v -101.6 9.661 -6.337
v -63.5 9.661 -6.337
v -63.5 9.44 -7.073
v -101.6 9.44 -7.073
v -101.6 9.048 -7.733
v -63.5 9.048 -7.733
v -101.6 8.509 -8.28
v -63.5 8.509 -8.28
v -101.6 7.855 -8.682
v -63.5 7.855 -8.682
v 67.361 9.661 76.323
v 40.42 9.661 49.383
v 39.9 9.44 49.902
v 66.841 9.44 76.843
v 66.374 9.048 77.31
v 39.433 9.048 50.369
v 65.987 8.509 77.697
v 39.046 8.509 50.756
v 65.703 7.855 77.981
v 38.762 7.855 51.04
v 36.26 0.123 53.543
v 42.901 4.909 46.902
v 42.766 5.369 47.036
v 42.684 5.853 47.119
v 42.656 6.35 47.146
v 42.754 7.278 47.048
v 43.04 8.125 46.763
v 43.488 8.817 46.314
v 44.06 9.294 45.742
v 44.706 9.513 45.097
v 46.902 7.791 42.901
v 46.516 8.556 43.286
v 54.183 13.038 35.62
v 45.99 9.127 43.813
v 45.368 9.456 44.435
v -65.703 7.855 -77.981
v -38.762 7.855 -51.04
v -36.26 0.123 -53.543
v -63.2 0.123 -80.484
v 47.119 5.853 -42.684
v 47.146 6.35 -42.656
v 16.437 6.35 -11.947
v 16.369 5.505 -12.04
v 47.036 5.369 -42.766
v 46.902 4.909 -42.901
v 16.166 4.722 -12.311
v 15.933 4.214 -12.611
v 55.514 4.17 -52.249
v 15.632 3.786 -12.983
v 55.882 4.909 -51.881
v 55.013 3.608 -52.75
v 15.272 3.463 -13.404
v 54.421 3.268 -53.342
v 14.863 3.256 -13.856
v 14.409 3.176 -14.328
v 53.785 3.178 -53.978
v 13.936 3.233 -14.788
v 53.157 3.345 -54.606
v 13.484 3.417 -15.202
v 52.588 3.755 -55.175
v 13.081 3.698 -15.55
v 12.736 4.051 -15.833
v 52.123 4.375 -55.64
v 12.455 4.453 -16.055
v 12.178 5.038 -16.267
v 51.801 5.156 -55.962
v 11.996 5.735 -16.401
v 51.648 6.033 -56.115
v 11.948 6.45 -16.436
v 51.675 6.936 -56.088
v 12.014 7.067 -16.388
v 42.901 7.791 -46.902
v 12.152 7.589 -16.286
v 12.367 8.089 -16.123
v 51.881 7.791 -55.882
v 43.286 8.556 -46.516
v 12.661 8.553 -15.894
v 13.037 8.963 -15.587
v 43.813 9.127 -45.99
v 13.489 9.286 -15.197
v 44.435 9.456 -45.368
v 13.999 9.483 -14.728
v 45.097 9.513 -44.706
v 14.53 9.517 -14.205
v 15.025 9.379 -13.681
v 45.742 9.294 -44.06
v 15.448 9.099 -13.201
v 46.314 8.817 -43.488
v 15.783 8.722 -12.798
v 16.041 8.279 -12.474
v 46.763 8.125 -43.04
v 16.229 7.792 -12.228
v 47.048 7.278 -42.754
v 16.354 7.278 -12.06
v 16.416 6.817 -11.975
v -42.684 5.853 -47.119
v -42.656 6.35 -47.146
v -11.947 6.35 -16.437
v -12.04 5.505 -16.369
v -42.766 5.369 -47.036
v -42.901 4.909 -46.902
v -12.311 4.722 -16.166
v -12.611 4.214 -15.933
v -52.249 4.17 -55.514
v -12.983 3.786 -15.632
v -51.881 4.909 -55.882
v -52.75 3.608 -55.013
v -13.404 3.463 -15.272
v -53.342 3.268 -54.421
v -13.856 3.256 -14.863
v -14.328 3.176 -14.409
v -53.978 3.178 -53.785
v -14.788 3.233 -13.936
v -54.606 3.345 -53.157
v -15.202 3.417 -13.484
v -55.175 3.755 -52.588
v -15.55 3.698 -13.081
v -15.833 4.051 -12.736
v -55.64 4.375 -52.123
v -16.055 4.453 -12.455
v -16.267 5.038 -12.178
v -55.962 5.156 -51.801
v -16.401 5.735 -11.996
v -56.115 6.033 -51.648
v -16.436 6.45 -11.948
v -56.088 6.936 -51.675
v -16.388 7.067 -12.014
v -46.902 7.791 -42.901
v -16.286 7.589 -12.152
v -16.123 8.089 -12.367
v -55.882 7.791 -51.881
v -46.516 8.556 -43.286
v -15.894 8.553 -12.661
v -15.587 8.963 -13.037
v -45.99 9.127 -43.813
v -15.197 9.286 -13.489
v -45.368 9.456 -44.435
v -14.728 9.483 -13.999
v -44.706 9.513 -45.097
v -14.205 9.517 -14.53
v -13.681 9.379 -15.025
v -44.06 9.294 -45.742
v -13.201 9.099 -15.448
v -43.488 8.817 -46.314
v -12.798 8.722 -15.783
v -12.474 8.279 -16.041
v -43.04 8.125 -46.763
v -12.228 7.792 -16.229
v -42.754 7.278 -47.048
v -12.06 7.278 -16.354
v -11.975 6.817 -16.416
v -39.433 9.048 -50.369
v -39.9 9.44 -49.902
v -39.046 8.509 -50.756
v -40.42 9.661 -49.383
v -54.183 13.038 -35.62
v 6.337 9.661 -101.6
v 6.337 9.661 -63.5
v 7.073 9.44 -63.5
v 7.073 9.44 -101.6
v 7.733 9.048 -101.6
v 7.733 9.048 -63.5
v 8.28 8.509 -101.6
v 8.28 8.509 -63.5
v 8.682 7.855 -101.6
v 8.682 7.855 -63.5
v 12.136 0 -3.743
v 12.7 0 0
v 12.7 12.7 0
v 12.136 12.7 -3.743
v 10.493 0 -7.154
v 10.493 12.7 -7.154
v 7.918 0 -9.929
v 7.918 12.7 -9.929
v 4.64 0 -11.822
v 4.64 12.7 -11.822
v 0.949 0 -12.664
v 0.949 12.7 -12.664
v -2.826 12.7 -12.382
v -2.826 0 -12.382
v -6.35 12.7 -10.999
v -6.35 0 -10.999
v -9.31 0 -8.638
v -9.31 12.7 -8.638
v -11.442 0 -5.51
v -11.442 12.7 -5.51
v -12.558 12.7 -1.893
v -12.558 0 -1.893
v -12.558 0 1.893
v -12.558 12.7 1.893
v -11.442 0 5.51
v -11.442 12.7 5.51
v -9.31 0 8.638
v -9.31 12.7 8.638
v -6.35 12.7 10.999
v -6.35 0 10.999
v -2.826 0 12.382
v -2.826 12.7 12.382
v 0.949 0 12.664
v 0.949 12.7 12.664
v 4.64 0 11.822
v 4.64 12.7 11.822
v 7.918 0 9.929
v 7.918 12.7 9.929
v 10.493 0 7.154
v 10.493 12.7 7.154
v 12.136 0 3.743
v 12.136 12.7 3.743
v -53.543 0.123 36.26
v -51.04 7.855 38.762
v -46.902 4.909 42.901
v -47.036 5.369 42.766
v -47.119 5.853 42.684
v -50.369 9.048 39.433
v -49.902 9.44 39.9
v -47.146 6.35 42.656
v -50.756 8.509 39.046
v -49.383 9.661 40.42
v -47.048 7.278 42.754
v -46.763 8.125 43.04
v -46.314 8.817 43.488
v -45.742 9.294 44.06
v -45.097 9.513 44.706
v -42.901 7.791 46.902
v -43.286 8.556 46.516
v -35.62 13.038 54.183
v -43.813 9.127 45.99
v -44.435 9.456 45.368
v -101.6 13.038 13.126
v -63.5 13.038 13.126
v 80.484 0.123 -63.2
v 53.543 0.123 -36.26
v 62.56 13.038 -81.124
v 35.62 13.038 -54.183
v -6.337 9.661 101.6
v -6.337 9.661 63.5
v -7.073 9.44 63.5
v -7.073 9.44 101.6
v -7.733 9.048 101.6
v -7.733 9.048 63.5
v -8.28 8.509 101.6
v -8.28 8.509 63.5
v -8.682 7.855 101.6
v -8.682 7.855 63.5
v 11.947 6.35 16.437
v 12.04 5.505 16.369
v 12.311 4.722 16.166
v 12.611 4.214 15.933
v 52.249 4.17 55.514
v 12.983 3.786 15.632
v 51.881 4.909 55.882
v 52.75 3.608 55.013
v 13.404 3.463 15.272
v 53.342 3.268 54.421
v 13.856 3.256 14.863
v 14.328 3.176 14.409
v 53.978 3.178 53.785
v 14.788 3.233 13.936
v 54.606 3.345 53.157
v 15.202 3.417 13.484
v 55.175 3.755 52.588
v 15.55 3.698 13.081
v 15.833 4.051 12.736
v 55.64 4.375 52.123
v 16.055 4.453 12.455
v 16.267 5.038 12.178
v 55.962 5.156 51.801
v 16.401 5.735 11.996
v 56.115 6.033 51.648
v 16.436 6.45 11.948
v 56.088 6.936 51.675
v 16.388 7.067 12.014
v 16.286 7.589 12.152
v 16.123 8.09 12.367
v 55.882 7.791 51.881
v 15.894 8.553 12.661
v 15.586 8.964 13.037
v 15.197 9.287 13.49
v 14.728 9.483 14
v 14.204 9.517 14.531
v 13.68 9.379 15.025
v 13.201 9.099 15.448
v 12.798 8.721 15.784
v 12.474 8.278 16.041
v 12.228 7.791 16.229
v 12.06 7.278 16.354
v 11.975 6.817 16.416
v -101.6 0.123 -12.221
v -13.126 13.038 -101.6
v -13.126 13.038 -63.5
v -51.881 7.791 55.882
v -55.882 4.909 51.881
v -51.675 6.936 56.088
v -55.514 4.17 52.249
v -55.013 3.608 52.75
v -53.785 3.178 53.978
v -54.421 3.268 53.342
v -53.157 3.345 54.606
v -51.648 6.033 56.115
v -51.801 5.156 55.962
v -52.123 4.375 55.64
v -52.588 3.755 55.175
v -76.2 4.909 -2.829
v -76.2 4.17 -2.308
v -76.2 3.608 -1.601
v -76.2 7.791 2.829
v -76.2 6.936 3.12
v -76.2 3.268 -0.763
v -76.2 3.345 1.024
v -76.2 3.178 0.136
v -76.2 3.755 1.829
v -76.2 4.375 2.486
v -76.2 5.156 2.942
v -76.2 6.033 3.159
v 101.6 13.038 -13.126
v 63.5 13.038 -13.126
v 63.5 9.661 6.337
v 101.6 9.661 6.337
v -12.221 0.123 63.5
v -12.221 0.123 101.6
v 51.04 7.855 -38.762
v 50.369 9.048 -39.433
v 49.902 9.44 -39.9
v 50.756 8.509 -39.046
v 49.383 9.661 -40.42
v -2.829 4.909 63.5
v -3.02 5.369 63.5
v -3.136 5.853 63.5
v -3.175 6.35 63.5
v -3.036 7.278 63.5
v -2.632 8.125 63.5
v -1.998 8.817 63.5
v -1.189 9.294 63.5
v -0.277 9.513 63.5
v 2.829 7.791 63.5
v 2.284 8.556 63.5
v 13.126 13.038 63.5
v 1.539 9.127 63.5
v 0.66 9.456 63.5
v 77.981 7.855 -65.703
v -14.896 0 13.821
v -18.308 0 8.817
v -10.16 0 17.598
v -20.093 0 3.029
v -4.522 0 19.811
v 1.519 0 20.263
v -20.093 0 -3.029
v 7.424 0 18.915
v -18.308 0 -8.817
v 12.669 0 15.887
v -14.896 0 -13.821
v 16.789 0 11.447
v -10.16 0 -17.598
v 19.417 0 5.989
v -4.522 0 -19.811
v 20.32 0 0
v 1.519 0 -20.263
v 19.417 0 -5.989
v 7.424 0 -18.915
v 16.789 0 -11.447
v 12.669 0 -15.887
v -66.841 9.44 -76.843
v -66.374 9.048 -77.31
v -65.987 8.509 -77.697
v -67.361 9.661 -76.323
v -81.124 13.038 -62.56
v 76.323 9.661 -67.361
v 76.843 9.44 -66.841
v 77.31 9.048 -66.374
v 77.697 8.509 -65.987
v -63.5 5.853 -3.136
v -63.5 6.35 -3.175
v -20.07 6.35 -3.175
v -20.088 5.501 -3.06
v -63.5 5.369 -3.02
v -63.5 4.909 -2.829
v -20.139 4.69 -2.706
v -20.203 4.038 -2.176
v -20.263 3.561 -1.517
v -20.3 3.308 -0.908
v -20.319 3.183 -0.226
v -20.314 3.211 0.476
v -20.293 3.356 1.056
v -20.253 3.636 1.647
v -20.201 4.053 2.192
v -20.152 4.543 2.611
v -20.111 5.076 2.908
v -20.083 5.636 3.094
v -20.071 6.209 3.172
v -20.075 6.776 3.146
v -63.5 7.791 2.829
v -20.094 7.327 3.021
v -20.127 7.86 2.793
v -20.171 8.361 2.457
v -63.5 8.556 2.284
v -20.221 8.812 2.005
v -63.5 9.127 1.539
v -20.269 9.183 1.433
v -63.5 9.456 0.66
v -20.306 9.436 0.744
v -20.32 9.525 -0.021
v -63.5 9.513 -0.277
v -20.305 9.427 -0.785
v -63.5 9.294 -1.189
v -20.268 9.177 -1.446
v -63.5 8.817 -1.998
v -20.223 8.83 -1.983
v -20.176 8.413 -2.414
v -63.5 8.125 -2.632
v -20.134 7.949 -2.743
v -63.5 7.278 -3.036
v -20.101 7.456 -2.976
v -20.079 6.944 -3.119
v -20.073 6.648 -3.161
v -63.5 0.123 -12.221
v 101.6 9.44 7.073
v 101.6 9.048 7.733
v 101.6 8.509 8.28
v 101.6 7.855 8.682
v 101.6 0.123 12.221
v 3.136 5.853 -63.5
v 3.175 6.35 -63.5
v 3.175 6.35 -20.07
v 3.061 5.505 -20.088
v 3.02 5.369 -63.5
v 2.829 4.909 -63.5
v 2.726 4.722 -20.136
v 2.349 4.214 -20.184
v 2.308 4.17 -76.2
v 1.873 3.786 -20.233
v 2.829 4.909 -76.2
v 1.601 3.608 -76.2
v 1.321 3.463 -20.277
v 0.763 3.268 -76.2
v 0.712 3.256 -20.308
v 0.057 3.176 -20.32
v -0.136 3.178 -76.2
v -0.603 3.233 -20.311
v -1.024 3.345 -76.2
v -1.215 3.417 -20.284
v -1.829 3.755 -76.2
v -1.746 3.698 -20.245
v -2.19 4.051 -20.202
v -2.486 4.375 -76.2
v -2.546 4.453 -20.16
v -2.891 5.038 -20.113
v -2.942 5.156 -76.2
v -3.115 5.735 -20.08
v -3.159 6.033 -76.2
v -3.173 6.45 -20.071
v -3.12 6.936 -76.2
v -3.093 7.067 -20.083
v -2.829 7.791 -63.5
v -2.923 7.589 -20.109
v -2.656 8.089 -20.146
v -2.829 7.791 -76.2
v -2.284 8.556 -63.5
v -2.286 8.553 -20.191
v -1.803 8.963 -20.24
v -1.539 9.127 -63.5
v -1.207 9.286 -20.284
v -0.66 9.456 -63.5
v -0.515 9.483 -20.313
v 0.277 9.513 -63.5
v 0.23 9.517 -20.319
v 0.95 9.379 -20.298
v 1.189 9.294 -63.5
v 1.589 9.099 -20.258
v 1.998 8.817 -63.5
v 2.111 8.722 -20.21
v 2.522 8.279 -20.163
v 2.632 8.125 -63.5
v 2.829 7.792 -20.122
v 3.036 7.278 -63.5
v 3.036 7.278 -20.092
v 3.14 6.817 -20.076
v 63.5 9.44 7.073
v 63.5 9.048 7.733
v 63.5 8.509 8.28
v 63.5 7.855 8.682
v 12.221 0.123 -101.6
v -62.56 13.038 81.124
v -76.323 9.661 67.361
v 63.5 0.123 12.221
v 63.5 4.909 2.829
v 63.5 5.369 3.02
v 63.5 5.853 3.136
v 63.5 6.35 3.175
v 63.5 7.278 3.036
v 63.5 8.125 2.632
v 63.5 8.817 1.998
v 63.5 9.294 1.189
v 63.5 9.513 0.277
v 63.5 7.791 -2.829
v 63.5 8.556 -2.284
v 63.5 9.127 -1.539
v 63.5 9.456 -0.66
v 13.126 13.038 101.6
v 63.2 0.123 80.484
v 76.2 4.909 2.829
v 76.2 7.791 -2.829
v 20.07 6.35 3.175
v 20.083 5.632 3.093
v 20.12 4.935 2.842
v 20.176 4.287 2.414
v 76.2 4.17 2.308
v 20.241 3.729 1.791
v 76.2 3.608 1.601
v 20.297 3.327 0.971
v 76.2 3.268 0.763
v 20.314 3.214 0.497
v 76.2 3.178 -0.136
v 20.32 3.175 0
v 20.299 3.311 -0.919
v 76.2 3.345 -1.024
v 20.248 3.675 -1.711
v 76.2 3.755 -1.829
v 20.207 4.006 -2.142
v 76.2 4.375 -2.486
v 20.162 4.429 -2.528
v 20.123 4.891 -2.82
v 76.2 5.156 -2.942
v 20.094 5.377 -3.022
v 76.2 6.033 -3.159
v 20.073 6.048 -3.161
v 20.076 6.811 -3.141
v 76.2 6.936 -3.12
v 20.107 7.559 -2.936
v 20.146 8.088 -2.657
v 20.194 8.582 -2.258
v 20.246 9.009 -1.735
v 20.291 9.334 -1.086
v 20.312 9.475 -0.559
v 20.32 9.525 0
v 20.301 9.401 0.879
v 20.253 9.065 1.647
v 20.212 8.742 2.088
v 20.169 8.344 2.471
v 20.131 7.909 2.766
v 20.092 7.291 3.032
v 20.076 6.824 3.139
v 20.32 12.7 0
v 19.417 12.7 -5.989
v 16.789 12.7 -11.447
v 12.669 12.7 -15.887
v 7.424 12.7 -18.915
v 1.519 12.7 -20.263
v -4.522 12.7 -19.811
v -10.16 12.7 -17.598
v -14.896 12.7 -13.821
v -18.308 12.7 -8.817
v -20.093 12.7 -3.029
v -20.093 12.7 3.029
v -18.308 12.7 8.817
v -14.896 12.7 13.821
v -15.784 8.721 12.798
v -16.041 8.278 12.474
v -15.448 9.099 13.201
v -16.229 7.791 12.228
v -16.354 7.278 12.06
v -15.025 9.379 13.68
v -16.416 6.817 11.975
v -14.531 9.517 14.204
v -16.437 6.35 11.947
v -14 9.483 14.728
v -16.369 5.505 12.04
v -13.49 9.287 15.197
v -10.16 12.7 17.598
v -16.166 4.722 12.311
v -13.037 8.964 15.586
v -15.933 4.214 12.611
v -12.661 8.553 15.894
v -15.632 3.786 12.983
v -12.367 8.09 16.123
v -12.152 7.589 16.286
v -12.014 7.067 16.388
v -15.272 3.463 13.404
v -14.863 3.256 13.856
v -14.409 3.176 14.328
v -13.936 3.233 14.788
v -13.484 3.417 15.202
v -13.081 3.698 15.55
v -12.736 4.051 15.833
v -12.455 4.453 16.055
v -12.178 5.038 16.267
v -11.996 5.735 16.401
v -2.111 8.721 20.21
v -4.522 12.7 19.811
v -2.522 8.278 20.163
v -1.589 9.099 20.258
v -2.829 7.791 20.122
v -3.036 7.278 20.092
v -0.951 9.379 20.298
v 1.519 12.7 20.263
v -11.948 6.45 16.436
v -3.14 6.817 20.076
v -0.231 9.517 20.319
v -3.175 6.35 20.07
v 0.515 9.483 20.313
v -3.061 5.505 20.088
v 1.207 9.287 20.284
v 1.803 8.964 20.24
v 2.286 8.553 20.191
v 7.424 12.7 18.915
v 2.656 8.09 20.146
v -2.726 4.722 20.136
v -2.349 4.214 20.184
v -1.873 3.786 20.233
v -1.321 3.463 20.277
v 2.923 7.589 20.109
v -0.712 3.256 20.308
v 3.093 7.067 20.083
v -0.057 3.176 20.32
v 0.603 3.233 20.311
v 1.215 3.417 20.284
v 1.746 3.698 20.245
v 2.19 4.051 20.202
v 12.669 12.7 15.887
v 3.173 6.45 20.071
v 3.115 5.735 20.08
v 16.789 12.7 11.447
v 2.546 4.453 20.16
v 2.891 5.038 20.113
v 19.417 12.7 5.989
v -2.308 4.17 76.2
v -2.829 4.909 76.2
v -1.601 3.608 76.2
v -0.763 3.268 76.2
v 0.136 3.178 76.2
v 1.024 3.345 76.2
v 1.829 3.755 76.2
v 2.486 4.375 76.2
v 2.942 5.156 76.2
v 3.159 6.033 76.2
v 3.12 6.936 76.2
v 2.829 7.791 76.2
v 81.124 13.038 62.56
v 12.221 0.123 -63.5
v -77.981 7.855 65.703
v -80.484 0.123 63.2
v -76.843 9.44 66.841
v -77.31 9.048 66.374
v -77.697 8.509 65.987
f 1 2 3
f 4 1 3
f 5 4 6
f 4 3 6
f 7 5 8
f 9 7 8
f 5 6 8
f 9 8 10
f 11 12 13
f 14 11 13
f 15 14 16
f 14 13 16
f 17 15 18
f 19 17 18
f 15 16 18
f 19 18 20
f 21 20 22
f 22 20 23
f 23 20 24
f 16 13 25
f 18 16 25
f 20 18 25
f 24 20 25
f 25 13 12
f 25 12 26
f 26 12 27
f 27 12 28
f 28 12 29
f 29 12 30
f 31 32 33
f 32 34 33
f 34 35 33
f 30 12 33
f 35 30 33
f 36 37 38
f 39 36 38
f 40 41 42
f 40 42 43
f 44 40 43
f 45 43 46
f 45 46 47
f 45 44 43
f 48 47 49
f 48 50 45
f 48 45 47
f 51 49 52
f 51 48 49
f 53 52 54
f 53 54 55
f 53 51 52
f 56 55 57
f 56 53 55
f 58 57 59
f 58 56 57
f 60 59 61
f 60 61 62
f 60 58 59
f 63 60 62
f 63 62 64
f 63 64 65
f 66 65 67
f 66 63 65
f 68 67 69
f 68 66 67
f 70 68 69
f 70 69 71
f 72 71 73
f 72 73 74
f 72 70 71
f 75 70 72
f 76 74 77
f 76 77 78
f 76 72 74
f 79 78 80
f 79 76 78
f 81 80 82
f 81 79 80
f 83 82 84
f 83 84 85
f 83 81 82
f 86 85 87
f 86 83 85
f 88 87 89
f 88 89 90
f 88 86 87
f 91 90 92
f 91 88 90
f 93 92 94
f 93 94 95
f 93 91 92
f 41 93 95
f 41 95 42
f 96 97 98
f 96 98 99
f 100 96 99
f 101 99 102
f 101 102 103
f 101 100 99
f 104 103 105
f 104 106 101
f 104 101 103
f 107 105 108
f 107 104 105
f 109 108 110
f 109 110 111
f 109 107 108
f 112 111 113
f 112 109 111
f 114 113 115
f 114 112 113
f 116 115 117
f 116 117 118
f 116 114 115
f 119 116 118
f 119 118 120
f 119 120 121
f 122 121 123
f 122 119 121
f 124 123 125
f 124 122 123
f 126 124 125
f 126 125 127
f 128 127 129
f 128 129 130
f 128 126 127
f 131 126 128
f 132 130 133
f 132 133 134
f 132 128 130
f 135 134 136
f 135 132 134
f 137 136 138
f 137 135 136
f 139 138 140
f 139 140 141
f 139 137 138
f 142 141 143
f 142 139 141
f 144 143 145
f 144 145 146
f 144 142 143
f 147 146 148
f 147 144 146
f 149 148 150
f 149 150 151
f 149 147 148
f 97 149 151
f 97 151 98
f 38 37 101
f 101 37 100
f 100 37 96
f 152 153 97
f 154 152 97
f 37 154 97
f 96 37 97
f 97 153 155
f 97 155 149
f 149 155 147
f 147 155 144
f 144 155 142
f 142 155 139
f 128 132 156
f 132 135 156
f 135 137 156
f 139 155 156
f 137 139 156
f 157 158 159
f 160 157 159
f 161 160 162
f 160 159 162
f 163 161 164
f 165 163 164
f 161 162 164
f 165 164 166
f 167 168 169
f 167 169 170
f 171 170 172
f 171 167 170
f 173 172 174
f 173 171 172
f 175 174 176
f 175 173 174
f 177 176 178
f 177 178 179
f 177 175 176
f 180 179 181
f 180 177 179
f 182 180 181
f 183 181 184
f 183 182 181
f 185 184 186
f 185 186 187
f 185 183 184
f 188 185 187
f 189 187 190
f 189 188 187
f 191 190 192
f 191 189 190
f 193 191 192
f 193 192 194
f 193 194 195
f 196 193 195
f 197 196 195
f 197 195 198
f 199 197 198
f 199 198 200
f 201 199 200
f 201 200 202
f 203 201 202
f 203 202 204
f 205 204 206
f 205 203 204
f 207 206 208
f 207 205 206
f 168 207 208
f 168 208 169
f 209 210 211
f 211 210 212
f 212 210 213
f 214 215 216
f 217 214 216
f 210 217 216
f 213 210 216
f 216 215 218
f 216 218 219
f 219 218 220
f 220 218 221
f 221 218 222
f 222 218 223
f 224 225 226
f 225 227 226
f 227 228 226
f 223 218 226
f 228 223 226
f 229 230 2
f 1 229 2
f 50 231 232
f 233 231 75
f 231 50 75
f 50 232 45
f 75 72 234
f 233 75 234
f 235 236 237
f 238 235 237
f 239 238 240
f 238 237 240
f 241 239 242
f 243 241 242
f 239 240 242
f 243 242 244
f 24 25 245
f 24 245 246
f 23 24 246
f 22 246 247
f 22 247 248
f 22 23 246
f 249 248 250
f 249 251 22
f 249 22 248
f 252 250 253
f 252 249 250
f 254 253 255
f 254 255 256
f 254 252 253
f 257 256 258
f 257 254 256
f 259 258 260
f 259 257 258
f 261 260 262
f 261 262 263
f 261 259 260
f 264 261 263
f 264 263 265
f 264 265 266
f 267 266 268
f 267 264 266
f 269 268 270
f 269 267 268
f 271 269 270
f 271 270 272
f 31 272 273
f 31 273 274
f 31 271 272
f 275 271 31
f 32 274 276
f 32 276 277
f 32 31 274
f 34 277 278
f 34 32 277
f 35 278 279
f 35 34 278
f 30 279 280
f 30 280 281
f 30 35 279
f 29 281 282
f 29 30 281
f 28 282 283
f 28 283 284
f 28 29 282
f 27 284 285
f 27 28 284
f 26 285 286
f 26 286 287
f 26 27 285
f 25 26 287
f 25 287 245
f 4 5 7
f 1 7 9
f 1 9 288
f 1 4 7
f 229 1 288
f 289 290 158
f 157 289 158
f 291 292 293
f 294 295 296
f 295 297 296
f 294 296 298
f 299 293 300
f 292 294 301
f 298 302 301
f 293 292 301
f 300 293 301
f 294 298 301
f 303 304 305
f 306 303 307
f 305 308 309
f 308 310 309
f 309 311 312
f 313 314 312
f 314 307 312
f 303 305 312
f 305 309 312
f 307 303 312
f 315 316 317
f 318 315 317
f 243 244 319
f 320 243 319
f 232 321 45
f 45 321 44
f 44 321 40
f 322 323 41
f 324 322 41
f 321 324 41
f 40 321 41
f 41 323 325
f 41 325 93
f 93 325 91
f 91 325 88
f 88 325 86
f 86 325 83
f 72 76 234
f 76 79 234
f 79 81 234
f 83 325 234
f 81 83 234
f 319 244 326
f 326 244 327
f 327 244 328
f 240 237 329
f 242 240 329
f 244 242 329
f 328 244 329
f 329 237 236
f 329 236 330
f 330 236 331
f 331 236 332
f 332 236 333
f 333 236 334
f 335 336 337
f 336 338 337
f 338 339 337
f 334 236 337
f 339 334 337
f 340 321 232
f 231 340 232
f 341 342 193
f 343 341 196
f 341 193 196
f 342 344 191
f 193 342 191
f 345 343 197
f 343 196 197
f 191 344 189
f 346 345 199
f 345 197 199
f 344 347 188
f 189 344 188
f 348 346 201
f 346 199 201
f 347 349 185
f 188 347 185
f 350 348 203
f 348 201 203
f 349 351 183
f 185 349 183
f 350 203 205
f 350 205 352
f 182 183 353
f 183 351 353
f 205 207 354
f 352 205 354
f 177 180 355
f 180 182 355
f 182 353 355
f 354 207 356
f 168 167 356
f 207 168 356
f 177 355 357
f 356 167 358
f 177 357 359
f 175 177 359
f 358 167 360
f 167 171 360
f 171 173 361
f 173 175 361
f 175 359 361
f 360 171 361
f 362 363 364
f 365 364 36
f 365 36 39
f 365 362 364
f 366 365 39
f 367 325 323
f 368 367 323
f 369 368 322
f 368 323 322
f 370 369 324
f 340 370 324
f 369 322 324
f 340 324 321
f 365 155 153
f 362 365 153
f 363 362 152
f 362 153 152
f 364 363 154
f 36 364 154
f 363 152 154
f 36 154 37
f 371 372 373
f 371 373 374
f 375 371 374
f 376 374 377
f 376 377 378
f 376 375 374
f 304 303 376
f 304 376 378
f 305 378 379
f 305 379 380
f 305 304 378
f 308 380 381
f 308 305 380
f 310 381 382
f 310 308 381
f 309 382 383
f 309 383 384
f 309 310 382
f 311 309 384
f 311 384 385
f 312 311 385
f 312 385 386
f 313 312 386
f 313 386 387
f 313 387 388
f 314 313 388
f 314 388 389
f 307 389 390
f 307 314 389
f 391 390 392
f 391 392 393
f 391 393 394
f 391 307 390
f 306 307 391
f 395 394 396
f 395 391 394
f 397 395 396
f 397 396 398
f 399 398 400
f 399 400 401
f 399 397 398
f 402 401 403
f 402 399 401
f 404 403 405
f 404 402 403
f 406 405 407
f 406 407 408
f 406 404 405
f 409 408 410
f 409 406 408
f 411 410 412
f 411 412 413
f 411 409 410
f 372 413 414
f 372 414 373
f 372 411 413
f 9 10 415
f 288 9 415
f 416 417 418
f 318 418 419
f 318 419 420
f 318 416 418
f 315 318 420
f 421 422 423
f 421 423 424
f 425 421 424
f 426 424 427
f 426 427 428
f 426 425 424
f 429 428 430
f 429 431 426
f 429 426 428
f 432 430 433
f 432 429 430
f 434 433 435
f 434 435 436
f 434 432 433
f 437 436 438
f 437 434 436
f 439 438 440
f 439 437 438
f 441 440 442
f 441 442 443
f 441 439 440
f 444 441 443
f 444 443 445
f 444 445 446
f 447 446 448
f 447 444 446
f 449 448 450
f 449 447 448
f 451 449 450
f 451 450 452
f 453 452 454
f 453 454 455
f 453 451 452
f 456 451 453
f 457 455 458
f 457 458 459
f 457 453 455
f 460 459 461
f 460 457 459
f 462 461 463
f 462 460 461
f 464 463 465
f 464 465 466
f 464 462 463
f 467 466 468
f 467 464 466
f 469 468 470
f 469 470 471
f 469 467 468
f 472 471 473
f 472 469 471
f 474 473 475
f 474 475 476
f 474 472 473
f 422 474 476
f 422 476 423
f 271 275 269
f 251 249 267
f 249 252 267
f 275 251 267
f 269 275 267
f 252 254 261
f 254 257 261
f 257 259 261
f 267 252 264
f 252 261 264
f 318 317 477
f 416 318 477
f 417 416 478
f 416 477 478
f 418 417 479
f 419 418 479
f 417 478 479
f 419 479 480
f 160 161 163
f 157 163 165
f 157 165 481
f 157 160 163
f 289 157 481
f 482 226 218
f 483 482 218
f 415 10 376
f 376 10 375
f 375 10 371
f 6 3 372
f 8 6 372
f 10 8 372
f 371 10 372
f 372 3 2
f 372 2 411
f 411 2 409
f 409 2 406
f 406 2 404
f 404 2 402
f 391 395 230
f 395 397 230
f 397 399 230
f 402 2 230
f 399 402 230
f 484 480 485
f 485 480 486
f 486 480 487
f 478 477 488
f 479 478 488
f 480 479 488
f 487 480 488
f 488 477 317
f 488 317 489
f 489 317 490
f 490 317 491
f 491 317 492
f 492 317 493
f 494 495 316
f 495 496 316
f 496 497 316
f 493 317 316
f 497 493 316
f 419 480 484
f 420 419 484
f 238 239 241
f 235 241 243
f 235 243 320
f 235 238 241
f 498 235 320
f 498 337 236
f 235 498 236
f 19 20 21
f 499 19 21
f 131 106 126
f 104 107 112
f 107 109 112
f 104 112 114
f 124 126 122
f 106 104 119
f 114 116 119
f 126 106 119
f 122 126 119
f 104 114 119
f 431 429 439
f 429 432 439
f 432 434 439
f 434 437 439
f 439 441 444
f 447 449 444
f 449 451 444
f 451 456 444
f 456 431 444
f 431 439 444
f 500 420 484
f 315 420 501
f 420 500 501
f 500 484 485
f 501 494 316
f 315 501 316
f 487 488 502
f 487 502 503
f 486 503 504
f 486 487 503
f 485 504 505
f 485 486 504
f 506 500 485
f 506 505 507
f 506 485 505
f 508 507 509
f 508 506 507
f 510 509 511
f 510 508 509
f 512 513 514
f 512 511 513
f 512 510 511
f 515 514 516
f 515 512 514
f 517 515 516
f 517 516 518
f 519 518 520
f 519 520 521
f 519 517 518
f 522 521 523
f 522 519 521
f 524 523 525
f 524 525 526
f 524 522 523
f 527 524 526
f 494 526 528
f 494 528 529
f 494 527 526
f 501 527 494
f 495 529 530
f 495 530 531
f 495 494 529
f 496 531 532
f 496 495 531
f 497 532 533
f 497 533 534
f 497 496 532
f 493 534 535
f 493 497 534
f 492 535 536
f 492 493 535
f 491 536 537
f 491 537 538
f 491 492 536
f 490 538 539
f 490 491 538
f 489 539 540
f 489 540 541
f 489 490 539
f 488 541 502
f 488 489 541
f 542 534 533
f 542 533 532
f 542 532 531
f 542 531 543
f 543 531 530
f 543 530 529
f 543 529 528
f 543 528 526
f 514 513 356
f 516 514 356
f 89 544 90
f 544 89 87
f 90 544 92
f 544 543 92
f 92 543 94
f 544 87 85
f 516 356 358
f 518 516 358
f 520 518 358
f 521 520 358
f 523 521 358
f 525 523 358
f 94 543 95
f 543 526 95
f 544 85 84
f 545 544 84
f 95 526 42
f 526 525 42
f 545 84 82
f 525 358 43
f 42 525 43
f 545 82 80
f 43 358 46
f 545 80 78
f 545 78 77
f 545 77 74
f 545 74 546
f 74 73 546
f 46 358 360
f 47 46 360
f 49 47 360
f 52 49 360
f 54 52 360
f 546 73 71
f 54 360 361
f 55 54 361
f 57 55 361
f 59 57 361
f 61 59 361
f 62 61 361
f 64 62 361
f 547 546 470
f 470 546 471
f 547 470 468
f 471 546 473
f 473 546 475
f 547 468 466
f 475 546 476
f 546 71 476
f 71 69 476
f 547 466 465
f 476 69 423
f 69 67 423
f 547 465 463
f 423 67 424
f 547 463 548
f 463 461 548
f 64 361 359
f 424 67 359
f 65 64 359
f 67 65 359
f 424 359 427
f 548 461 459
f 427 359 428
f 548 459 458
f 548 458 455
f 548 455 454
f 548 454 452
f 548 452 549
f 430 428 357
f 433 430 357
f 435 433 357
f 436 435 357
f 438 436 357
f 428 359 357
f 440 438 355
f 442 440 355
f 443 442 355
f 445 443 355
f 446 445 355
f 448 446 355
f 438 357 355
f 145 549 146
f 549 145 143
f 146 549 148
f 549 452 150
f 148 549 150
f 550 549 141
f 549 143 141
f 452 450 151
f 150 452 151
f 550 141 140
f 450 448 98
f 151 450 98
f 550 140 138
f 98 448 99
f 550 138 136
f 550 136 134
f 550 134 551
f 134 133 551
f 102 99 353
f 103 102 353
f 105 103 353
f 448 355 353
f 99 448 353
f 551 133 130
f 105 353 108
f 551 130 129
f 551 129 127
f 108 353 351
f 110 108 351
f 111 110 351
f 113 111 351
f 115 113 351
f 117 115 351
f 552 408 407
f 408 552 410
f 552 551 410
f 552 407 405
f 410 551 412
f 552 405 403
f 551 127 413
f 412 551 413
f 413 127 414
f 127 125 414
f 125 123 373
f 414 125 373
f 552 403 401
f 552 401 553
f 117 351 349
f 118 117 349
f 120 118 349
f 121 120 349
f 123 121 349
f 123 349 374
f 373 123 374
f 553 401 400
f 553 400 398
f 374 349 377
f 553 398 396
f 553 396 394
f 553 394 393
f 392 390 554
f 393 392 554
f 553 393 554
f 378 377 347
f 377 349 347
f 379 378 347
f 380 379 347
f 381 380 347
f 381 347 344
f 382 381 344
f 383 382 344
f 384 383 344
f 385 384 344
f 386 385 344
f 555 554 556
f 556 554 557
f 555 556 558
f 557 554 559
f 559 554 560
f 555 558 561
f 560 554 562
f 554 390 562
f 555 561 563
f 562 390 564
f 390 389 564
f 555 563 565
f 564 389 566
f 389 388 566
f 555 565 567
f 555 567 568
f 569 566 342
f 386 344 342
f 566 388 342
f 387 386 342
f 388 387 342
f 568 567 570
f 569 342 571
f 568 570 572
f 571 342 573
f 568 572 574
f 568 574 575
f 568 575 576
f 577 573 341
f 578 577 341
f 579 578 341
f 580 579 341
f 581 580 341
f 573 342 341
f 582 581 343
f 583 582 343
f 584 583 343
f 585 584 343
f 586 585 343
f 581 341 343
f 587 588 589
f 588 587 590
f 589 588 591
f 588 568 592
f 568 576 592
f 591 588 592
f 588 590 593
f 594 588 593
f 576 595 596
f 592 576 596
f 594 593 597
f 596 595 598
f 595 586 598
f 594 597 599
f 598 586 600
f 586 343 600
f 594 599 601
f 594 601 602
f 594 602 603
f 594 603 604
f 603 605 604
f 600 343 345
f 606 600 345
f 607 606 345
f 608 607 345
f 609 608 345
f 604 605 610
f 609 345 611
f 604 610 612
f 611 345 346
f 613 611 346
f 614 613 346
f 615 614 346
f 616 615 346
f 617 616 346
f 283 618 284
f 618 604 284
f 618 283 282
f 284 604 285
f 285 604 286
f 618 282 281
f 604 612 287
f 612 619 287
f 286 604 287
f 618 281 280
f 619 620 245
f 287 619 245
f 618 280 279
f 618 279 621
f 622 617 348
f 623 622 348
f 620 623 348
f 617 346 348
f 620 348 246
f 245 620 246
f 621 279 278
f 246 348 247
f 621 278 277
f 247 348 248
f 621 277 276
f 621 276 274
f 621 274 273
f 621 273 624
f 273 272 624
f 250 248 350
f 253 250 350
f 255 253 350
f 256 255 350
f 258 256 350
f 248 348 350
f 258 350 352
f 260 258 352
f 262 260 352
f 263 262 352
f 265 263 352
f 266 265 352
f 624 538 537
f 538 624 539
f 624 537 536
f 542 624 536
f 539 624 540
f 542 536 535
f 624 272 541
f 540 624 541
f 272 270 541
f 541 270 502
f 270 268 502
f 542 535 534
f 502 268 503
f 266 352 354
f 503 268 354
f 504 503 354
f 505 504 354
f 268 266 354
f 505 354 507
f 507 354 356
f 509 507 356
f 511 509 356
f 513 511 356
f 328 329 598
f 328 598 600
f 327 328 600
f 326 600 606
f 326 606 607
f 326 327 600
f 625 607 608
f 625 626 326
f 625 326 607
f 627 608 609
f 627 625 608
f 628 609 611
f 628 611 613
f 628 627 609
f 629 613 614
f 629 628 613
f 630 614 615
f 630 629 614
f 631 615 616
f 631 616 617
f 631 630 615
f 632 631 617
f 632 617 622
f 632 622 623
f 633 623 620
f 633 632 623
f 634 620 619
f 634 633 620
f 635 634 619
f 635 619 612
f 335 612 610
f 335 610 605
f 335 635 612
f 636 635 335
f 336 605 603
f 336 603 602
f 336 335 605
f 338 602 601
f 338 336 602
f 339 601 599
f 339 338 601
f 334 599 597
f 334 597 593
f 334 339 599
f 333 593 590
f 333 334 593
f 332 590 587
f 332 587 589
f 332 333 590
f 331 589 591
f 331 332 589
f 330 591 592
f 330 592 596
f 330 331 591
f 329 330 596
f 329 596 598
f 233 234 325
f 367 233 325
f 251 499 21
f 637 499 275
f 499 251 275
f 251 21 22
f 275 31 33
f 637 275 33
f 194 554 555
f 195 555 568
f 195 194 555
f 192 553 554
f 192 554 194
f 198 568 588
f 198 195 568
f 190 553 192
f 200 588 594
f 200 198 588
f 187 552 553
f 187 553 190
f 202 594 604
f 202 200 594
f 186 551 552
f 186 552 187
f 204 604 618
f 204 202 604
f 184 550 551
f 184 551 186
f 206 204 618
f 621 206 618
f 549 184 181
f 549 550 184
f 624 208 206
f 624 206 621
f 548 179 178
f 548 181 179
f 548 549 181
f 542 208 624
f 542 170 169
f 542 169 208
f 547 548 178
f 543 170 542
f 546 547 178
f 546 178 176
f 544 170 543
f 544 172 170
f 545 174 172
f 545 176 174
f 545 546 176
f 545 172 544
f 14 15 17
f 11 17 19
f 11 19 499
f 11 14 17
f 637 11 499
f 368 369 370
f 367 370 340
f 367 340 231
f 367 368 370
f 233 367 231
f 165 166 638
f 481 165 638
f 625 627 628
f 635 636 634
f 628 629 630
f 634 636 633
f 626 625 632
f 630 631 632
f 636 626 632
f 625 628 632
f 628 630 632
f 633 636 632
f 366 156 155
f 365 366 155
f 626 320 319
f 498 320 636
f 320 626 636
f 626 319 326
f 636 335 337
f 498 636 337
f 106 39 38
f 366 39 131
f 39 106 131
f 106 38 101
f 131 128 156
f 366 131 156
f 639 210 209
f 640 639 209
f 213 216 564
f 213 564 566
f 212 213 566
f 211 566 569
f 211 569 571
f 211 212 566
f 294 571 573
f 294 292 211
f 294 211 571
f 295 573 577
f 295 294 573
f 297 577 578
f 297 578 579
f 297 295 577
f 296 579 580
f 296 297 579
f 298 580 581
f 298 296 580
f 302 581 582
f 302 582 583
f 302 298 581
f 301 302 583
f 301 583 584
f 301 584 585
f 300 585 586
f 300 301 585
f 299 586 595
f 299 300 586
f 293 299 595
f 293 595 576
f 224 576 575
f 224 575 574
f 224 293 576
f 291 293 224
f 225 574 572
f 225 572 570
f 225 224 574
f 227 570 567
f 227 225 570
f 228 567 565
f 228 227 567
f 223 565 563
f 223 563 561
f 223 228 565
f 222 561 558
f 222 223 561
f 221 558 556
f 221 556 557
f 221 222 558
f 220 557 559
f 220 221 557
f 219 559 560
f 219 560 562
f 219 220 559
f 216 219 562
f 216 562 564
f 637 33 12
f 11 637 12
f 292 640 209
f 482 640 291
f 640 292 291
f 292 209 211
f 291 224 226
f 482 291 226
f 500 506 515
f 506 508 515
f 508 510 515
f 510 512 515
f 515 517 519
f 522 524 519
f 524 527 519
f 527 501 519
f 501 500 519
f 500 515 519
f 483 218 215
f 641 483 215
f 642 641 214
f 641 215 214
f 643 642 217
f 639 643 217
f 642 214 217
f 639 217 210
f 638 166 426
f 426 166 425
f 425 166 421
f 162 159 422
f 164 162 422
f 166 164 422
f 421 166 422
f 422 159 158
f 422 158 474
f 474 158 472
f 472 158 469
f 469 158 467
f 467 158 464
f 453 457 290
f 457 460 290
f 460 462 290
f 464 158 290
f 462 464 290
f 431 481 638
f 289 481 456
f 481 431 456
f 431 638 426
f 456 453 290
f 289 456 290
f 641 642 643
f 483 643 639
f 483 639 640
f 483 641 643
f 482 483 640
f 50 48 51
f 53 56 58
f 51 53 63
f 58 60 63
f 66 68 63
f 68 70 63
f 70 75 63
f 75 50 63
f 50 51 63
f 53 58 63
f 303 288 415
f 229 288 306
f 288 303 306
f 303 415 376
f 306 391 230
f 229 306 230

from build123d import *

# Parameters (mm, degrees)
SKETCH1_R           = 20.32
SKETCH1_R_2         = 12.7
BOSS_EXTRUDE1_DEPTH = 12.7
SKETCH2_W           = 3.175
SKETCH2_H           = 56.129579601
BOSS_EXTRUDE2_DEPTH = 38.1
CIRPATTERN1_COUNT   = 8


with BuildPart() as part:
    # Sketch1 → Boss-Extrude1 (new body)
    with BuildSketch(Plane(origin=(0, 0, 0), x_dir=(1, 0, 0), z_dir=(0, 1, 0))):
        Circle(SKETCH1_R)
        Circle(SKETCH1_R_2, mode=Mode.SUBTRACT)
    extrude(amount=BOSS_EXTRUDE1_DEPTH)

    # Sketch2 → Revolve1 (revolve)
    with BuildSketch(Plane(origin=(0, 6.35, 0), x_dir=(1, 0, 0), z_dir=(0, 1, 0))):
        with Locations((1.5875, 48.1352102)):
            Rectangle(SKETCH2_W, SKETCH2_H)
    revolve1 = revolve(axis=Axis((0, 6.35, -20.070420399), (0, 0, -1)))

    # Sketch4 → Boss-Extrude2 (add)
    with BuildSketch(Plane(origin=(0, 0, -63.5), x_dir=(-1, 0, 0), z_dir=(0, 0, -1))):
        with BuildLine():
            Line((-12.221045486, 0.123066306), (13.126308114, 13.038188042))
            Line((13.126308114, 13.038188042), (-6.337477412, 9.661472478))
            ThreePointArc((-6.337477412, 9.661472478), (-7.732958134, 9.047961526), (-8.681650548, 7.854753733))
            Line((-8.681650548, 7.854753733), (-12.221045486, 0.123066306))
        make_face()
    boss_extrude2 = extrude(amount=BOSS_EXTRUDE2_DEPTH)

    # CirPattern1: Revolve1, Boss-Extrude2 ×8 about axis
    cirpattern1_axis = Axis((0, 0, 0), (0, 1, 0))
    for i in range(1, CIRPATTERN1_COUNT):
        add(revolve1.rotate(cirpattern1_axis, i * 360 / CIRPATTERN1_COUNT))
        add(boss_extrude2.rotate(cirpattern1_axis, i * 360 / CIRPATTERN1_COUNT))


solid = part.part
